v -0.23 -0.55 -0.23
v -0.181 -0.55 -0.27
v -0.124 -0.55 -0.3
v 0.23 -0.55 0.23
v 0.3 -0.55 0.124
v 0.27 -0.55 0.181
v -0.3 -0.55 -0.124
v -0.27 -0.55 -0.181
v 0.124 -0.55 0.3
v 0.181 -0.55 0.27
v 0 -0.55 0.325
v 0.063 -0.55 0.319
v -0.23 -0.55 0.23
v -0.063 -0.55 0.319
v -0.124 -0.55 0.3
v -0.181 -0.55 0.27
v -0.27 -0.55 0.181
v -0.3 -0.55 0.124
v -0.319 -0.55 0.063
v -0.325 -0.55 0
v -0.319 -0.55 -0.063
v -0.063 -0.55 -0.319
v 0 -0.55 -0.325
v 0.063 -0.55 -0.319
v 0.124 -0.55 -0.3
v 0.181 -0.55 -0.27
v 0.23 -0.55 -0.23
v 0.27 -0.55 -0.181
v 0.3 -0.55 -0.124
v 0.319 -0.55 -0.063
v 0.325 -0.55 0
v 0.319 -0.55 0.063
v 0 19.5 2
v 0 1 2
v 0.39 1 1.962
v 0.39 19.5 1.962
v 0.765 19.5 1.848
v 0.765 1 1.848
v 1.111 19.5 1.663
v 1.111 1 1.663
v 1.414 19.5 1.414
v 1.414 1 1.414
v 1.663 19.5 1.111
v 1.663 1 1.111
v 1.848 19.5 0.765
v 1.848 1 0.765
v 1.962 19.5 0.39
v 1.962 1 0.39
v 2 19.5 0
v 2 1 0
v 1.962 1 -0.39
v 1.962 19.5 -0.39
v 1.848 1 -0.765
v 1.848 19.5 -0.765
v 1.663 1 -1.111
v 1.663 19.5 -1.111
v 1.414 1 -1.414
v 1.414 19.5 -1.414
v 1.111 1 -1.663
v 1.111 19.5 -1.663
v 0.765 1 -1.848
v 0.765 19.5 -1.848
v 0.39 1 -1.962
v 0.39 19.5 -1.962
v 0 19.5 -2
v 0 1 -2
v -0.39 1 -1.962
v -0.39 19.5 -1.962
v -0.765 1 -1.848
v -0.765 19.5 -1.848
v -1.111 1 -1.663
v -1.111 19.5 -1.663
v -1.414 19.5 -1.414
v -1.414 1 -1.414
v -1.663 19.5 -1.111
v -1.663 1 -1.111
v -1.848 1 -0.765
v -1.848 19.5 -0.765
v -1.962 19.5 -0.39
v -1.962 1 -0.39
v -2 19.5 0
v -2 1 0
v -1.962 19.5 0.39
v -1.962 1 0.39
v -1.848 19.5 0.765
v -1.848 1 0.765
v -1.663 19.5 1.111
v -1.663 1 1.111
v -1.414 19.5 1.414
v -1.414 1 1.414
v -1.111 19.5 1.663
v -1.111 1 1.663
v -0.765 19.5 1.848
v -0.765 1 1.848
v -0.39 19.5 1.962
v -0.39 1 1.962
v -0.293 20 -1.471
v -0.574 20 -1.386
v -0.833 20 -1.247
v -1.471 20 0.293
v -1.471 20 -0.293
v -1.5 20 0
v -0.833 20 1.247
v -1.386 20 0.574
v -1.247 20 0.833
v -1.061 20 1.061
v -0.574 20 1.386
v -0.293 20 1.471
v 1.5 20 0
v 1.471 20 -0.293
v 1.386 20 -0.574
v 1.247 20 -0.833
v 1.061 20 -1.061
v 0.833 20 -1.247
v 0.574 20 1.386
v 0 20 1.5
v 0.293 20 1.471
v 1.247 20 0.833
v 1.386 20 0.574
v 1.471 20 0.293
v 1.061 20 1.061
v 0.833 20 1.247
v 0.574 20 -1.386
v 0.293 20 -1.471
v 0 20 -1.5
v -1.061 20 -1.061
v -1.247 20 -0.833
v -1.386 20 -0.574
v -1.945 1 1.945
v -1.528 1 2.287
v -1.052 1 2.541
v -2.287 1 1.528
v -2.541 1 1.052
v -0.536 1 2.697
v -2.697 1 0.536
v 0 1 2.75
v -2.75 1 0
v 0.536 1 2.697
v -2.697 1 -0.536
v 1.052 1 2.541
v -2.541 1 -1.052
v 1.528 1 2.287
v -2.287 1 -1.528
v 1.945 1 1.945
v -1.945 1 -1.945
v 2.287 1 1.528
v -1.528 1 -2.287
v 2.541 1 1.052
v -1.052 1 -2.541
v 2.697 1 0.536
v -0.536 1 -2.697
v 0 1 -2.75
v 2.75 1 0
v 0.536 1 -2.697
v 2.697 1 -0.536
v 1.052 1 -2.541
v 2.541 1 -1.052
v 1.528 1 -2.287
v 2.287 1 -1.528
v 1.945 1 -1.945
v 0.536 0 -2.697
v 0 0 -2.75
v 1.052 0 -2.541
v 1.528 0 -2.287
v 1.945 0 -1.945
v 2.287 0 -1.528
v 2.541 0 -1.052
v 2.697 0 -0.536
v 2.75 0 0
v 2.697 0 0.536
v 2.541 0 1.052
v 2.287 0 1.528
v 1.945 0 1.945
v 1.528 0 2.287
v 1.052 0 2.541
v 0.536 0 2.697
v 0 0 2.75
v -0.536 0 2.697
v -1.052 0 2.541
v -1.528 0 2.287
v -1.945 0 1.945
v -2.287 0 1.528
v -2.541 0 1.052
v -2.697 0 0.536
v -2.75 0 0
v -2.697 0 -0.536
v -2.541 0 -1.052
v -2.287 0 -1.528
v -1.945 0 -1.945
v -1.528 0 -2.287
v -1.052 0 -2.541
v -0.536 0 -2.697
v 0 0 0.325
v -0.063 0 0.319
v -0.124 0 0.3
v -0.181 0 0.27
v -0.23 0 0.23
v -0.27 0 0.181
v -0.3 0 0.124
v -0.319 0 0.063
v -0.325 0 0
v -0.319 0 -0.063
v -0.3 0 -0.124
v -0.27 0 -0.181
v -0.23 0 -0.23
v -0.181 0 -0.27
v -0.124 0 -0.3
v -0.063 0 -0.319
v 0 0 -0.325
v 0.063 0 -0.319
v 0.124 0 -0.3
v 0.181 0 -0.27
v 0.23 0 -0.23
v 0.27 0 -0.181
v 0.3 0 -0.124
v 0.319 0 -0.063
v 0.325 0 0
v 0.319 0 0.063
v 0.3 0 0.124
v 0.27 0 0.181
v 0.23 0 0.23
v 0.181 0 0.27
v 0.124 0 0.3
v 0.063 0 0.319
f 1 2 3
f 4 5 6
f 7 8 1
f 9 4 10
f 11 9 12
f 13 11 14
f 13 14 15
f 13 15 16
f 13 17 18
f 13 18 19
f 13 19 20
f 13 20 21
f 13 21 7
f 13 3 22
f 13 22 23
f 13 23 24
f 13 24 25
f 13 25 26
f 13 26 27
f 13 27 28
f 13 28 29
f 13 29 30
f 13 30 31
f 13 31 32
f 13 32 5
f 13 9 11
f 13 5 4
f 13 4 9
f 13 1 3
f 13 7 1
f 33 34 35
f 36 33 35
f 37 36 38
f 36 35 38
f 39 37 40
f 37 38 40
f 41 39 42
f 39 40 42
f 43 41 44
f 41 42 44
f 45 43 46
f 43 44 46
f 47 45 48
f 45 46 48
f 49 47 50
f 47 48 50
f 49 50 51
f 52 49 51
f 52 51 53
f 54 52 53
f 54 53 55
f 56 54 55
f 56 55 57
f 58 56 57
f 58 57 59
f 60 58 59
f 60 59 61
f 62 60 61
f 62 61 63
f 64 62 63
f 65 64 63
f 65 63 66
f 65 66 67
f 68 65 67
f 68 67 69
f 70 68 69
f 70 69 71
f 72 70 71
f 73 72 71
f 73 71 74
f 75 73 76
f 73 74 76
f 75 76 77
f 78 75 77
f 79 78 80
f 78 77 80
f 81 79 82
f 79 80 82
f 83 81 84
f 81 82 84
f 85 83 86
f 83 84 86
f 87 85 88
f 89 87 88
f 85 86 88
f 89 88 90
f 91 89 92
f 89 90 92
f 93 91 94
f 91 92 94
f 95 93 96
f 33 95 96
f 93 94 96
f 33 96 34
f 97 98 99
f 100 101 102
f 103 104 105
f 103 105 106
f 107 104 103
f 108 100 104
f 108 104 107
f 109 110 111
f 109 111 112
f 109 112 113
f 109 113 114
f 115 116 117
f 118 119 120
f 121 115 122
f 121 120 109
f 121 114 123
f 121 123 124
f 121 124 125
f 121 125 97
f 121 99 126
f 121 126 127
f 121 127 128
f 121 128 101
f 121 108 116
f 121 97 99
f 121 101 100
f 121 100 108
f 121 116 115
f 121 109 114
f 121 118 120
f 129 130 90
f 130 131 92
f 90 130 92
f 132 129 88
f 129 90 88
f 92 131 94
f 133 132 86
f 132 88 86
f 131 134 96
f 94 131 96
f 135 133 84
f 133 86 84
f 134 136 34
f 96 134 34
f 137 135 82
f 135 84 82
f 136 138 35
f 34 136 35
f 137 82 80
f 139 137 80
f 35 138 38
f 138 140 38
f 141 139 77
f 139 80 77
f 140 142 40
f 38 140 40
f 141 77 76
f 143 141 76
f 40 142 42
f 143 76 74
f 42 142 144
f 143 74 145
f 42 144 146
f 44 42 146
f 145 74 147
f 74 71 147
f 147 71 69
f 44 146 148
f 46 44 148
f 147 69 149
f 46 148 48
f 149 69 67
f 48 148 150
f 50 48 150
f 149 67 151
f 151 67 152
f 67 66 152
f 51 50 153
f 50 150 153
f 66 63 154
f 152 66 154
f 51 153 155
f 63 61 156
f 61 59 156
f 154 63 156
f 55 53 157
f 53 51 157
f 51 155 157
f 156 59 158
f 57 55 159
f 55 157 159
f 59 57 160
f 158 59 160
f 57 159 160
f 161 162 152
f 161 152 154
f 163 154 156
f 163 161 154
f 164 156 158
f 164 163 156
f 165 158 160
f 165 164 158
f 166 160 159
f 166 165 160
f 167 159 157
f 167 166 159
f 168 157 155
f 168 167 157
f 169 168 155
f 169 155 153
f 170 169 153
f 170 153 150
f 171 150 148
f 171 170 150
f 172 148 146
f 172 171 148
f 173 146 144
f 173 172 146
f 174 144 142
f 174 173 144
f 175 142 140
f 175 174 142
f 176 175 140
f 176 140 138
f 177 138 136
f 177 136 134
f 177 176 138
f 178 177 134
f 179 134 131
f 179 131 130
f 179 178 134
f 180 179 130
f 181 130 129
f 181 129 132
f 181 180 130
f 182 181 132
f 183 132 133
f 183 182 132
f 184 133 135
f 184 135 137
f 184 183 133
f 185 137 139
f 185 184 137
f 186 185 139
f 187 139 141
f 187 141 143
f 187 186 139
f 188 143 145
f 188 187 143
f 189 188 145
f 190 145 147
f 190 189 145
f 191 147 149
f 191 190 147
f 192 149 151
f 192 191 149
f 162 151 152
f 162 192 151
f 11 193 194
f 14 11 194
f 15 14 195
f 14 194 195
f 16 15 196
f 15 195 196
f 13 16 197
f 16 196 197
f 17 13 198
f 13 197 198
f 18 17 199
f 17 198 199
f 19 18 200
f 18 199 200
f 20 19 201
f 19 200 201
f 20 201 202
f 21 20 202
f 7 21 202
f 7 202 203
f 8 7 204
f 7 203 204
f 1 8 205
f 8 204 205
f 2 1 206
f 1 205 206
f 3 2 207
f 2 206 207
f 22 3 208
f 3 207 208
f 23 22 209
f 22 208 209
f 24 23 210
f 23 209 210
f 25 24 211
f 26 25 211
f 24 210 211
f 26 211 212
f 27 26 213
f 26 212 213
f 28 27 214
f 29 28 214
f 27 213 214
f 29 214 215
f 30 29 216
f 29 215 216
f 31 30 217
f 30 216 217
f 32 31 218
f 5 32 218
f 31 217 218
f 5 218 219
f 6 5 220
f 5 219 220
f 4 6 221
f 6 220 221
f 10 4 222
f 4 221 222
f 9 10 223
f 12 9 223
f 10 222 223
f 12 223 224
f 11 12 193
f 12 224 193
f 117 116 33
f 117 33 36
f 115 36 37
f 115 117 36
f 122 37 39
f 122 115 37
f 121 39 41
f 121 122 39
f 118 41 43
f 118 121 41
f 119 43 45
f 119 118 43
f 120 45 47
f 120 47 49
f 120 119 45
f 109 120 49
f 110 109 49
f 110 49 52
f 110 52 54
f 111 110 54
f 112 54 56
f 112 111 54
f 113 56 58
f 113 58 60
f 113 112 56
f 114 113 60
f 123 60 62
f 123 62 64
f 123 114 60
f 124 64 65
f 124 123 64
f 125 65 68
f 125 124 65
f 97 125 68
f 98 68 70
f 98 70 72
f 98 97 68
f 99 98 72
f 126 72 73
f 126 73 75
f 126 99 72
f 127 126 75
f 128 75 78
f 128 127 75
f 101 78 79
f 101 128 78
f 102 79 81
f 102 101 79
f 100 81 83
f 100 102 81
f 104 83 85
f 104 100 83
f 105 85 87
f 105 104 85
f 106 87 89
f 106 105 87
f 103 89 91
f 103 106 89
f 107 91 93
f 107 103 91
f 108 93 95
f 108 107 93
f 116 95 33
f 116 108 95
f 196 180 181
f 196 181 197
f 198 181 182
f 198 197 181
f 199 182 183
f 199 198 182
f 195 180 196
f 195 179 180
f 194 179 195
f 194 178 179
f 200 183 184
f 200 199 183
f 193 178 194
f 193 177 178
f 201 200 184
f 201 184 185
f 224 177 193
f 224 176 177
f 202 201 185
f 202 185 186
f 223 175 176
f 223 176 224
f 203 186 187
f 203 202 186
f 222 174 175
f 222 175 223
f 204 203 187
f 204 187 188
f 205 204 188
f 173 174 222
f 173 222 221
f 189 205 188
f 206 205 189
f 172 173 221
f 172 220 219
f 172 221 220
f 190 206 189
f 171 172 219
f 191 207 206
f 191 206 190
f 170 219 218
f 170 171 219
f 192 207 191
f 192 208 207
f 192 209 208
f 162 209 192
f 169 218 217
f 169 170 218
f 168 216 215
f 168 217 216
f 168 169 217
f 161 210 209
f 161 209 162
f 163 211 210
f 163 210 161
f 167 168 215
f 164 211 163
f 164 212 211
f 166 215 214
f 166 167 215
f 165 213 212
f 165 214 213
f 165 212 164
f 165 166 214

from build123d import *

# Parameters (mm, degrees)
SKETCH_1_R      = 2
EXTRUDE_1_DEPTH = 20
CHAMFER_1_SIZE  = 0.5
SKETCH_2_R      = 2.75
EXTRUDE_2_DEPTH = 1
SKETCH_3_R      = 0.325
EXTRUDE_3_DEPTH = 0.55


with BuildPart() as part:
    # Эскиз1 → Вытянуть1 (new body)
    with BuildSketch(Plane(origin=(0, 0, 0), x_dir=(1, 0, 0), z_dir=(0, 1, 0))):
        with Locations(Location((0, 0, 0), (0, 0, 270))):
            Circle(SKETCH_1_R)
    extrude(amount=EXTRUDE_1_DEPTH)

    # Фаска1
    chamfer_1_edges = [part.edges().sort_by_distance(p)[0] for p in [
        (0, 20, -2),
    ]]
    chamfer(chamfer_1_edges, length=CHAMFER_1_SIZE)

    # Эскиз2 → Вытянуть2 (add)
    with BuildSketch(Plane.XZ):
        with Locations(Location((0, 0, 0), (0, 0, 270))):
            Circle(SKETCH_2_R)
    extrude(amount=-EXTRUDE_2_DEPTH)

    # Эскиз3 → Вытянуть3 (add)
    with BuildSketch(Plane.XZ):
        with Locations(Location((0, 0, 0), (0, 0, 90))):
            Circle(SKETCH_3_R)
    extrude(amount=EXTRUDE_3_DEPTH)


solid = part.part
